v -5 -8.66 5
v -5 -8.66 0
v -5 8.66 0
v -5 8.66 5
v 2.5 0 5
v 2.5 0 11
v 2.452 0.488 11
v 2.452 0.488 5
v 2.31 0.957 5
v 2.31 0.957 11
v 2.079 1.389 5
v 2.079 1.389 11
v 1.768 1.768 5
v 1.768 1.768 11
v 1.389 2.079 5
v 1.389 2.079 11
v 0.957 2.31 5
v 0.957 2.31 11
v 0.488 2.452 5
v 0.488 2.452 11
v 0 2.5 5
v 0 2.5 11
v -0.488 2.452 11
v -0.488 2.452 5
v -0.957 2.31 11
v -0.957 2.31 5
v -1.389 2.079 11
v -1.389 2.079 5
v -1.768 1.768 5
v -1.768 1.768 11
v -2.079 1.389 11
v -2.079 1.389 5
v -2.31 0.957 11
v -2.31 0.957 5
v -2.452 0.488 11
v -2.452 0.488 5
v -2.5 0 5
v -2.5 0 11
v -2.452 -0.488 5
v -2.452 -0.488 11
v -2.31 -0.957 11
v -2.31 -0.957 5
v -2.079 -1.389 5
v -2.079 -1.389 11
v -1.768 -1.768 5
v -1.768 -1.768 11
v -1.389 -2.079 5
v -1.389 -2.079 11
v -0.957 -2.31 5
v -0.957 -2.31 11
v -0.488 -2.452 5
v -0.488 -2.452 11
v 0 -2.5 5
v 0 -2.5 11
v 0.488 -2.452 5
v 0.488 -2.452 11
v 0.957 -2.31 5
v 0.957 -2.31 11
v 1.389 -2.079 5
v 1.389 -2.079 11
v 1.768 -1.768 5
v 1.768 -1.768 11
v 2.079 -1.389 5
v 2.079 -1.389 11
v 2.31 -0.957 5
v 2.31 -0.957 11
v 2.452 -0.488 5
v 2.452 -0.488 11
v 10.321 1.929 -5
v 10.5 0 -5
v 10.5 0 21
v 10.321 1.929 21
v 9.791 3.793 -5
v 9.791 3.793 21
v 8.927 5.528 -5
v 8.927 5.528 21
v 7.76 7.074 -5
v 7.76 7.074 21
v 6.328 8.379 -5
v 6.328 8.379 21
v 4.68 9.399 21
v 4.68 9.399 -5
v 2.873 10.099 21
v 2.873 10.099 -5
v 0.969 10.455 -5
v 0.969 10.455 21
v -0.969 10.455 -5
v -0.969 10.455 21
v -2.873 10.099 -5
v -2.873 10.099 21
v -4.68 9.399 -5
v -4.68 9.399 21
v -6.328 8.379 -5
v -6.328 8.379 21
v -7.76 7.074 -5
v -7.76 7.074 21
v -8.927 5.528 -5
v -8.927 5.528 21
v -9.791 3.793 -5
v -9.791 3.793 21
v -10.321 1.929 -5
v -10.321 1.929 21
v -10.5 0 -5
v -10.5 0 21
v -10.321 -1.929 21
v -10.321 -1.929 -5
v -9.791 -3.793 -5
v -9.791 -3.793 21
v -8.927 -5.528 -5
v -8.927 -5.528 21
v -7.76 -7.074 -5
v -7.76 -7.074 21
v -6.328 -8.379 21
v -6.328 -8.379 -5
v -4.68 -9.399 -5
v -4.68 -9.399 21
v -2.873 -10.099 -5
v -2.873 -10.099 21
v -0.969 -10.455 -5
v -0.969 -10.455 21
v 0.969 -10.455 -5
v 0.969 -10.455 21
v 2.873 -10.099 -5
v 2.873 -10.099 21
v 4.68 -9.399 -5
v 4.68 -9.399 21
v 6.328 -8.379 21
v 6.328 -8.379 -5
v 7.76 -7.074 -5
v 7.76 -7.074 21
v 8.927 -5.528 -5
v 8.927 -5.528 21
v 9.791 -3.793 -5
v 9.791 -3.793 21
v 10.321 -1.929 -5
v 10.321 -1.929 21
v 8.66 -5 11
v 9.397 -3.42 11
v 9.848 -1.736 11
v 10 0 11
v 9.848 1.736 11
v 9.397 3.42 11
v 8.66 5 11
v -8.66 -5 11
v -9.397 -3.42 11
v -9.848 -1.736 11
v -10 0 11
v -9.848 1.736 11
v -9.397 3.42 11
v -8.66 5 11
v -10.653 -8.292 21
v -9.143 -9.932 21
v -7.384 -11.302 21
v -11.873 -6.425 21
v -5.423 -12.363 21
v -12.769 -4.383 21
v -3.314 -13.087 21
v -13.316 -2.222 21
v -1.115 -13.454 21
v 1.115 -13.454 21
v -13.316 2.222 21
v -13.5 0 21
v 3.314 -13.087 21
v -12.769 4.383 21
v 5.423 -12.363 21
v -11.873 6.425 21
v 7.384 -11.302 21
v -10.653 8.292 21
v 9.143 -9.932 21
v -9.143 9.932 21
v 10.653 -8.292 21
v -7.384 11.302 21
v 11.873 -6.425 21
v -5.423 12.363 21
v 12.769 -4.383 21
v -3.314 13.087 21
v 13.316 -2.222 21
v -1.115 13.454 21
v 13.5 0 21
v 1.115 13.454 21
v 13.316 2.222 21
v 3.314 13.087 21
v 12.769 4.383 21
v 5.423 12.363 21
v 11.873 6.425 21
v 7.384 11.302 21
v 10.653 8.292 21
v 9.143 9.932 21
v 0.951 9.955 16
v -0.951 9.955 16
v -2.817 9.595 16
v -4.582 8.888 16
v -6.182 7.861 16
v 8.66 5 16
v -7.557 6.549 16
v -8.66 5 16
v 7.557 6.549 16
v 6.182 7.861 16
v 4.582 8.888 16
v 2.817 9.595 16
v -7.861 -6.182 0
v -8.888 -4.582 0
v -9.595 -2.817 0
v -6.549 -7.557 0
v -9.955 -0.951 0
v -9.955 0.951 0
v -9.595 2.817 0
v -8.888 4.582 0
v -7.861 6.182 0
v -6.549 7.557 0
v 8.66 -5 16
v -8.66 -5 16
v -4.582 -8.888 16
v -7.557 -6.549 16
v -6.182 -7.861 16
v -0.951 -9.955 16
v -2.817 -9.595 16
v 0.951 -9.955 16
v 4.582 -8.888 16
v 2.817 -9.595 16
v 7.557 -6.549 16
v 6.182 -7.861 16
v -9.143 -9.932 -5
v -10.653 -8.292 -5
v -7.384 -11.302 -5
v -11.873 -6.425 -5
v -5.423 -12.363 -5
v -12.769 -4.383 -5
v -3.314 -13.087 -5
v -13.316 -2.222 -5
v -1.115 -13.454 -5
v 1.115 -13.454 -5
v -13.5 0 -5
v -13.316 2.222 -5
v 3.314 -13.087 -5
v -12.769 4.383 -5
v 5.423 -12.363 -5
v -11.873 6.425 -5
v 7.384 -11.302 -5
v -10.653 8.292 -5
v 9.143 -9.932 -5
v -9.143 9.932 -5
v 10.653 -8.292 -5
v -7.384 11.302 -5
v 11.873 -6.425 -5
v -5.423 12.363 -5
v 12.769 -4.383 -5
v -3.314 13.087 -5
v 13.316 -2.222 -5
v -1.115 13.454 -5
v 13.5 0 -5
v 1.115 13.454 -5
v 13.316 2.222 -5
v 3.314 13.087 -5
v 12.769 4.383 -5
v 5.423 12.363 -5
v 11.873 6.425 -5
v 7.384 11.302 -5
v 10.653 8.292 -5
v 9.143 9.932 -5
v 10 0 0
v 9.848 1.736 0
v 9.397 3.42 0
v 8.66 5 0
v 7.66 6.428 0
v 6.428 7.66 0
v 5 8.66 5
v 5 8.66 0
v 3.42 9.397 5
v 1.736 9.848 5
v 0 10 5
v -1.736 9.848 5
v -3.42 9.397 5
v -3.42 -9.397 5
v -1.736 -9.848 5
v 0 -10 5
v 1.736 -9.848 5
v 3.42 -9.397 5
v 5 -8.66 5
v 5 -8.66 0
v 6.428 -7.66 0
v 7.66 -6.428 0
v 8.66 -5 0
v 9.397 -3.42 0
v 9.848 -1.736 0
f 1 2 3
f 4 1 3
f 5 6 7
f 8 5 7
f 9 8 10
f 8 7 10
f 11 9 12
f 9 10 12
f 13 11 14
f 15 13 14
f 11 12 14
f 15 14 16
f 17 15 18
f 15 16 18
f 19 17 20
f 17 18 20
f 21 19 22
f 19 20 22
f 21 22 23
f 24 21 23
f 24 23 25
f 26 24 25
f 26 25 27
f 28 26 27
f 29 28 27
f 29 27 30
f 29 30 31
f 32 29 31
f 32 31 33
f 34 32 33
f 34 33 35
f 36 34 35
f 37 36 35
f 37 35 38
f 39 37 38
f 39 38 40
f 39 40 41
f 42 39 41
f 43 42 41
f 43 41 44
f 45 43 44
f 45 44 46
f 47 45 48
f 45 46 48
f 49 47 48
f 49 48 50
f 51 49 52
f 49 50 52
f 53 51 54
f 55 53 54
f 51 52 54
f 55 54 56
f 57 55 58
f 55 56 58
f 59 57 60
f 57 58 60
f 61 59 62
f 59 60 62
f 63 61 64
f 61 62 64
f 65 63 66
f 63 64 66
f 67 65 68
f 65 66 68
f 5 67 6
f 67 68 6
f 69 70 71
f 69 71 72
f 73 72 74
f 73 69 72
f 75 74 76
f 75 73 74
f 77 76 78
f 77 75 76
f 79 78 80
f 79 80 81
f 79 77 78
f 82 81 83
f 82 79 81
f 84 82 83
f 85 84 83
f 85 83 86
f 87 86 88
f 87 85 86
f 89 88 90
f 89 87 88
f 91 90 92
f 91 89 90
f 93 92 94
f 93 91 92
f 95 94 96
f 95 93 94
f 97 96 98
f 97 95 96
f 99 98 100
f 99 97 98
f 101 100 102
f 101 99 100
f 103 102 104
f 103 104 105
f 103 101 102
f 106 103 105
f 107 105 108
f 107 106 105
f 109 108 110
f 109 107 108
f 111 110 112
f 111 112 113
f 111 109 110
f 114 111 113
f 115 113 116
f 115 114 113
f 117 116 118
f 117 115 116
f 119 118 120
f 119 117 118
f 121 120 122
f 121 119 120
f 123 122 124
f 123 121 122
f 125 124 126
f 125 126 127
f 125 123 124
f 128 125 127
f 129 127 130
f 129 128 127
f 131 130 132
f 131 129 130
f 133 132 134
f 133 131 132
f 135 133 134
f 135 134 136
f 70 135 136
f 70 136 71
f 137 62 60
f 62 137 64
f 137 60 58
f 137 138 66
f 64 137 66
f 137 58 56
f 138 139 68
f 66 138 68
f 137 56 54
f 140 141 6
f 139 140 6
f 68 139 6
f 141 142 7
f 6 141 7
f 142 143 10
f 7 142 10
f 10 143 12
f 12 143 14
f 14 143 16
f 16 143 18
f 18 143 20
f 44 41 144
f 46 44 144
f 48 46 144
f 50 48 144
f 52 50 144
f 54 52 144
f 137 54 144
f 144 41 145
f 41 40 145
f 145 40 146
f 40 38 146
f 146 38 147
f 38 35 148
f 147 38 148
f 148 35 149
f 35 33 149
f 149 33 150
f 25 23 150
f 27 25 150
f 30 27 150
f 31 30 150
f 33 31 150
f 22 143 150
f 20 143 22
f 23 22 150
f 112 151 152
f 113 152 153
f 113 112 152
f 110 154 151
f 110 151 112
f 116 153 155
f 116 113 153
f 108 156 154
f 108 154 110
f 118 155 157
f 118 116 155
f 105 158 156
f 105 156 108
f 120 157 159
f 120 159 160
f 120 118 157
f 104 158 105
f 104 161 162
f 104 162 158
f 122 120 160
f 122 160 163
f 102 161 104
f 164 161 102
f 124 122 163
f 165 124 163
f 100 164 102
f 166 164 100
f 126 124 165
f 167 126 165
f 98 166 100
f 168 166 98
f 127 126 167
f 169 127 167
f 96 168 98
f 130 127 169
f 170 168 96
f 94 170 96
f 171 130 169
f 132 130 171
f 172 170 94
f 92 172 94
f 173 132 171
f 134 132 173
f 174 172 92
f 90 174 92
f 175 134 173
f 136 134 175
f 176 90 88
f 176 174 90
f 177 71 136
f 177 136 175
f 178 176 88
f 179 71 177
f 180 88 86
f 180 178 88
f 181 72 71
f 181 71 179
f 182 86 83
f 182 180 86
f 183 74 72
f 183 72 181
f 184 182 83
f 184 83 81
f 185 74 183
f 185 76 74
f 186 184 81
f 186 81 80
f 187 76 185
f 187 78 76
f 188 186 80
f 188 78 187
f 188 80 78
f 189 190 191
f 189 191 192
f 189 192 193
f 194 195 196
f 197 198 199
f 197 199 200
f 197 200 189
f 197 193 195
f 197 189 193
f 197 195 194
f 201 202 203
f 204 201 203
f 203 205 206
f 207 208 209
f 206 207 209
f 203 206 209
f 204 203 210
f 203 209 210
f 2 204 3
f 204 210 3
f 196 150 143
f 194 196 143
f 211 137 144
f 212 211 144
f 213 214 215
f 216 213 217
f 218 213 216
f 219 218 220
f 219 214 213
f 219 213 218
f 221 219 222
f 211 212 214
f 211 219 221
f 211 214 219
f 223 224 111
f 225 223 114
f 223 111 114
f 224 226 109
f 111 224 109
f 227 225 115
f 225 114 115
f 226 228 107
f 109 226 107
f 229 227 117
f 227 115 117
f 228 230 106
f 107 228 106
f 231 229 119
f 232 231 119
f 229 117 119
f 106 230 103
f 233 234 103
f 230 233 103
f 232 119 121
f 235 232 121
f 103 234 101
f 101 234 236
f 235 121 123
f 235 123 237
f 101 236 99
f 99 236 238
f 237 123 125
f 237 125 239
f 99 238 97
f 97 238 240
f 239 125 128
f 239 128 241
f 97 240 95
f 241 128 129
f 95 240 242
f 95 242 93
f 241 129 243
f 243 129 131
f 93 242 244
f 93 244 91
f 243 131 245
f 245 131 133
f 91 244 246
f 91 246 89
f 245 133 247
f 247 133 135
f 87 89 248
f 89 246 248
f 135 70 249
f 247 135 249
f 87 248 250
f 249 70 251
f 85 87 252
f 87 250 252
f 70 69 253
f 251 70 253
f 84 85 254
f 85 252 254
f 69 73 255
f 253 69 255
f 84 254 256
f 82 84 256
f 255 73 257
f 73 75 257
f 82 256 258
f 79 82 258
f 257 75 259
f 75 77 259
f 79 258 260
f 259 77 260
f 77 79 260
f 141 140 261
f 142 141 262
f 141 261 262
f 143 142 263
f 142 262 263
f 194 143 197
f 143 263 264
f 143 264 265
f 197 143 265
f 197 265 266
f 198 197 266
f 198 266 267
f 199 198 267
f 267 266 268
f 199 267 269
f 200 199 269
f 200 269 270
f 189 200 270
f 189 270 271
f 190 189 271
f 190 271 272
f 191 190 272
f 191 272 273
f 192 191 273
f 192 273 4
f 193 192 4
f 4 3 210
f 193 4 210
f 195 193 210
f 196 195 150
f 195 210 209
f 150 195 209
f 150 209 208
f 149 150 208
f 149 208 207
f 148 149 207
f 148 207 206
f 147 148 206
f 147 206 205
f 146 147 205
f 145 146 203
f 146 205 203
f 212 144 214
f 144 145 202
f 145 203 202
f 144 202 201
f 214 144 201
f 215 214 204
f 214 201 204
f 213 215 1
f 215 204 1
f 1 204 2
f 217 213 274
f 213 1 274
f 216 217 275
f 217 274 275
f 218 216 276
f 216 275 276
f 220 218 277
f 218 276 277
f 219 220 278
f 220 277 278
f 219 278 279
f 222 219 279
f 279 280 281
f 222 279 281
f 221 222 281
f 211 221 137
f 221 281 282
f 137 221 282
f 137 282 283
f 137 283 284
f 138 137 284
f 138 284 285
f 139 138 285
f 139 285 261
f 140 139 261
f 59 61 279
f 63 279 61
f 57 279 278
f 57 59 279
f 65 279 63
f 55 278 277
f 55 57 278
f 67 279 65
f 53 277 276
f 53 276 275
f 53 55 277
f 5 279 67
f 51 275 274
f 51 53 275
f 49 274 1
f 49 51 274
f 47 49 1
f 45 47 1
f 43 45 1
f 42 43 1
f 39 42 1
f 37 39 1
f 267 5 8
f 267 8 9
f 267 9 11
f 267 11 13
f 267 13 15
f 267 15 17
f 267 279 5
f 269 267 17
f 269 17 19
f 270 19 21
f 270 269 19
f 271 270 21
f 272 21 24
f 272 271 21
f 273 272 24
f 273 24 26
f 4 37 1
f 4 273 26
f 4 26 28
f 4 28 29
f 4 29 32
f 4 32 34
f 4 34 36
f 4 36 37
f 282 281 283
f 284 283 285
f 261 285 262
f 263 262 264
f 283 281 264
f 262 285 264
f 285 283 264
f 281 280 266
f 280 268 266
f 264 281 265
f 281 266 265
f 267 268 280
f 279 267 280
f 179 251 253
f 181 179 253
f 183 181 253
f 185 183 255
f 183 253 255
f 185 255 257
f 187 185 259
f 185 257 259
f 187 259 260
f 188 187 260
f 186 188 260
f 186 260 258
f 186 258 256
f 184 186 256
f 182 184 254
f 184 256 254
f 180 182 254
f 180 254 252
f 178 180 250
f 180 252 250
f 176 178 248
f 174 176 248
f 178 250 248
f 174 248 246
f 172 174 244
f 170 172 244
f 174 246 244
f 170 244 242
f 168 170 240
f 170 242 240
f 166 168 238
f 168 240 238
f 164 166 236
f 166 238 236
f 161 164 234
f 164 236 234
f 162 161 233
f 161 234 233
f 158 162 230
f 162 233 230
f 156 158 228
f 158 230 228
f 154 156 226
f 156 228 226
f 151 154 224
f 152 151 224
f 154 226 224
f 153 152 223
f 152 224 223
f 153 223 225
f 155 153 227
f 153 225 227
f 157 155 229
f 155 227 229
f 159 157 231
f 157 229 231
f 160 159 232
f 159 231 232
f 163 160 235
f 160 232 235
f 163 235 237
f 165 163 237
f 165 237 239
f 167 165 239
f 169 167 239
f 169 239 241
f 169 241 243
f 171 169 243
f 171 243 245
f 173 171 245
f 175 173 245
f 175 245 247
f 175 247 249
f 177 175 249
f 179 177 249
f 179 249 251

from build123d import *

# Parameters (mm, degrees)
ESBO_O1_R                    = 10
RESSALTO_EXTRUS_O1_DEPTH     = 16
CORTE_EXTRUS_O3_REACH        = 23.354
ESBO_O5_R                    = 2.5
CORTE_EXTRUS_O1_START        = -5
CORTE_EXTRUS_O1_DEPTH        = 5
CORTE_EXTRUS_O2_DEPTH        = 5
SALIENTE_EXTRUIR1_DEPTH      = 5
SALIENTE_EXTRUIR1_DEPTH_BACK = 21
CROQUIS1_R                   = 13.5
CROQUIS1_R_2                 = 10.5


with BuildPart() as part:
    # Esboço1 → Ressalto-extrusão1 (new body)
    with BuildSketch(Plane.XY):
        Circle(ESBO_O1_R)
    extrude(amount=RESSALTO_EXTRUS_O1_DEPTH)

    # Esboço5 → Corte-extrusão3 (cut, up to next)
    with BuildSketch(Plane.XY.offset(16), mode=Mode.PRIVATE) as corte_extrus_o3_sk1:
        Circle(ESBO_O5_R)
    corte_extrus_o3_tool1 = extrude(corte_extrus_o3_sk1.sketch, amount=-CORTE_EXTRUS_O3_REACH, mode=Mode.PRIVATE) & part.part
    add(corte_extrus_o3_tool1.solids().sort_by_distance((0, 0, 16))[0], mode=Mode.SUBTRACT)

    # Esboço2 → Corte-extrusão1 (cut)
    with BuildSketch(Plane.XY.offset(16).offset(CORTE_EXTRUS_O1_START)):
        with BuildLine():
            Line((-8.660254038, 5), (8.660254038, 5))
            ThreePointArc((8.660254038, 5), (10, 0), (8.660254038, -5))
            Line((8.660254038, -5), (-8.660254038, -5))
            ThreePointArc((-8.660254038, -5), (-10, 0), (-8.660254038, 5))
        make_face()
    extrude(amount=CORTE_EXTRUS_O1_DEPTH, mode=Mode.SUBTRACT)

    # Esboço4 → Corte-extrusão2 (cut)
    with BuildSketch(Plane(origin=(0, 0, 0), x_dir=(-1, 0, 0), z_dir=(0, 0, -1))):
        with BuildLine():
            Line((-5, 8.660254038), (-5, -8.660254038))
            ThreePointArc((-5, -8.660254038), (0, -10), (5, -8.660254038))
            Line((5, -8.660254038), (5, 8.660254038))
            ThreePointArc((5, 8.660254038), (0, 10), (-5, 8.660254038))
        make_face()
    extrude(amount=-CORTE_EXTRUS_O2_DEPTH, mode=Mode.SUBTRACT)


with BuildPart() as body_2:
    # Croquis1 → Saliente-Extruir1 (new, two sides: drawn at the far end of the back side and taken through both)
    with BuildSketch(Plane.XY.offset(16).offset(-SALIENTE_EXTRUIR1_DEPTH_BACK)):
        Circle(CROQUIS1_R)
        Circle(CROQUIS1_R_2, mode=Mode.SUBTRACT)
    extrude(amount=SALIENTE_EXTRUIR1_DEPTH + SALIENTE_EXTRUIR1_DEPTH_BACK)


solid = Compound([part.part, body_2.part])
